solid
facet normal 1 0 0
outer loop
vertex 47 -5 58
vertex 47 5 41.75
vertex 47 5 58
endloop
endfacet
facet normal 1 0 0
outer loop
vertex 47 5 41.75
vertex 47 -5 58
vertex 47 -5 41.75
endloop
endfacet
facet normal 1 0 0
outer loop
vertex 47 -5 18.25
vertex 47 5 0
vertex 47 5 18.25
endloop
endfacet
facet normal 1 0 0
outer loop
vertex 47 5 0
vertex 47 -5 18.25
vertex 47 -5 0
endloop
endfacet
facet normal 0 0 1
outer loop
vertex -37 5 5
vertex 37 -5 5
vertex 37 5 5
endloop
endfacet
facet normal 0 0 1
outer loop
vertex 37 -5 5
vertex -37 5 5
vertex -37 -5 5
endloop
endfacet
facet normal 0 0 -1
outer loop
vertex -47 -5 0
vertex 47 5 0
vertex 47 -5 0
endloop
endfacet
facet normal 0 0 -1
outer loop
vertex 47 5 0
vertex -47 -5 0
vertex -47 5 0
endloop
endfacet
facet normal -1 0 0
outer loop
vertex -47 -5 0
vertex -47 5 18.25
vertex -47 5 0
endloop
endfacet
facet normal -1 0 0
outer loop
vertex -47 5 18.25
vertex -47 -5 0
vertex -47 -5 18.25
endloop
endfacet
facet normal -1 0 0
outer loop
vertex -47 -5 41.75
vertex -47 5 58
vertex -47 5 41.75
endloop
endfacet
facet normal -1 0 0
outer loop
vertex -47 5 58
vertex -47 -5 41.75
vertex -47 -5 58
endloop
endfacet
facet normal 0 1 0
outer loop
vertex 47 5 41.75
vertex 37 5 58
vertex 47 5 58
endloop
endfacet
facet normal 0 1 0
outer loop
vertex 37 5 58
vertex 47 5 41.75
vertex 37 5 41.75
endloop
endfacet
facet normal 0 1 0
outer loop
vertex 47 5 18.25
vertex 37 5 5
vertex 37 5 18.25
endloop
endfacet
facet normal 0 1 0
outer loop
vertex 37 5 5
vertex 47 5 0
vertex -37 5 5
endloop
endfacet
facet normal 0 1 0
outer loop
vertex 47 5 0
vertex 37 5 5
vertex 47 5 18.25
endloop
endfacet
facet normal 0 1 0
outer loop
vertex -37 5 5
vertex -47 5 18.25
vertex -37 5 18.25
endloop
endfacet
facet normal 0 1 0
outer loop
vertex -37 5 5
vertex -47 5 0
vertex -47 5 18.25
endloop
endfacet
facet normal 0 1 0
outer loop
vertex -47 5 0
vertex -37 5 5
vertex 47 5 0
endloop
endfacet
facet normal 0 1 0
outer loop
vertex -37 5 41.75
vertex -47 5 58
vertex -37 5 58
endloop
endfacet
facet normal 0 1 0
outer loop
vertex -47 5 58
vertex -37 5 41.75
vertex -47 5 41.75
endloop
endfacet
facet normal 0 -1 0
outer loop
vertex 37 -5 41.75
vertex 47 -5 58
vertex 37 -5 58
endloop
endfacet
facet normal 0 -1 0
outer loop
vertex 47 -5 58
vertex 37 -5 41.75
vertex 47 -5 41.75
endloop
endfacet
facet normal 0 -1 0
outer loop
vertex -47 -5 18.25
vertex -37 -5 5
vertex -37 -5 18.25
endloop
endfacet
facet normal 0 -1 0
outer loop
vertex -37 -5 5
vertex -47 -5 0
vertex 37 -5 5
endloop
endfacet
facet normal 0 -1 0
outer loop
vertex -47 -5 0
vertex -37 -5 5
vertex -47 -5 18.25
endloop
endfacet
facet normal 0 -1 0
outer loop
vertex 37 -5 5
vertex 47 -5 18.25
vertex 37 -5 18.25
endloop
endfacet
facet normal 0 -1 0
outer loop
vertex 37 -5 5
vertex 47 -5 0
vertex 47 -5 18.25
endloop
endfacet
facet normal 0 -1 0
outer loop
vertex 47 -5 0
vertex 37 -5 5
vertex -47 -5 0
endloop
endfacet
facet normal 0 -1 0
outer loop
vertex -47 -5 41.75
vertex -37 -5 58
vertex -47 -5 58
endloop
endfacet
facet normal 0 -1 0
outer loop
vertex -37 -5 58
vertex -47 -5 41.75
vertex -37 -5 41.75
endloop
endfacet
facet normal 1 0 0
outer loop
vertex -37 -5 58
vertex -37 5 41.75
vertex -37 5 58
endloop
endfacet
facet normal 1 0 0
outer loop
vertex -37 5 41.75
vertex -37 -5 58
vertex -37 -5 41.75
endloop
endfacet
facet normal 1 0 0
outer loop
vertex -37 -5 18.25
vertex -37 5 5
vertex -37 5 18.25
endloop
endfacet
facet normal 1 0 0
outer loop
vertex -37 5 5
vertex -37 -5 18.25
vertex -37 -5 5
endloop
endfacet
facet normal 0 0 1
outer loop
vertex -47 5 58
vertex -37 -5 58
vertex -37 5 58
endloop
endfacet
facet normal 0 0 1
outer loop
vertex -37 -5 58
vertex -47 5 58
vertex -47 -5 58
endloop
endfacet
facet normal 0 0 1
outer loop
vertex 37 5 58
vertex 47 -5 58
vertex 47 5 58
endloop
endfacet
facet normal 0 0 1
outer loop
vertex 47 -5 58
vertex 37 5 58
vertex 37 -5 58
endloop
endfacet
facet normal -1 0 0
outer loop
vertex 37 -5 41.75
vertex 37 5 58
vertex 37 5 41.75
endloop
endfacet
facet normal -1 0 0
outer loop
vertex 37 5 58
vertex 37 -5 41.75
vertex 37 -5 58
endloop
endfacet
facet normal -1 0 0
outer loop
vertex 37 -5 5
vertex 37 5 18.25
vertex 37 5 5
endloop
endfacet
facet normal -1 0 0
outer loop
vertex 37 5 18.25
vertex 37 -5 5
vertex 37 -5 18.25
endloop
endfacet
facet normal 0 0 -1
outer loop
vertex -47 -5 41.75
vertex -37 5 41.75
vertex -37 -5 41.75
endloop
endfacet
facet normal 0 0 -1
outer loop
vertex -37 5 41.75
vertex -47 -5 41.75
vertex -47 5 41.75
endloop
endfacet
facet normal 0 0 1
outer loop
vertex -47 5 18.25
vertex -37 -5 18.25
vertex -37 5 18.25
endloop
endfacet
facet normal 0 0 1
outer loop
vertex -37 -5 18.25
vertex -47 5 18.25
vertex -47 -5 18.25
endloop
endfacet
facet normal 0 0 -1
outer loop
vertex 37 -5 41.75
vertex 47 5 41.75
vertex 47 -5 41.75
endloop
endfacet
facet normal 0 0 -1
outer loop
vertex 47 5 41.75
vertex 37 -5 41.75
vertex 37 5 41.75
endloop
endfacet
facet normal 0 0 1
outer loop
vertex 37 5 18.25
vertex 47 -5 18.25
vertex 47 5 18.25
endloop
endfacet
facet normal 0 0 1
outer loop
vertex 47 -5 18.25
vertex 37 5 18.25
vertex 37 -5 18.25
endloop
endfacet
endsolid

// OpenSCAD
// DRACO-Mini pan/tilt cradle — connected print-ready U-frame
servo_x = 22.8;
servo_y = 12.2;
servo_z = 28.5;
fit_clearance = 0.35;

wall=3;
inner_w=74;
arm_h=58;
arm_d=10;
bridge_w=inner_w+2*arm_d;
bridge_h=5;

// Servo pocket is kept fully inside each arm so subtraction cannot split the frame.
module servo_pocket(){
    cube([
        arm_d+2,
        servo_y+2*fit_clearance,
        servo_x+2*fit_clearance
    ],center=true);
}

module cradle(){
    difference(){
        union(){
            // Bottom bridge overlaps both side arms by bridge_h for a manifold one-piece print.
            translate([0,0,bridge_h/2])
                cube([bridge_w,arm_d,bridge_h],center=true);

            translate([-(inner_w/2+arm_d/2),0,arm_h/2])
                cube([arm_d,arm_d,arm_h],center=true);

            translate([(inner_w/2+arm_d/2),0,arm_h/2])
                cube([arm_d,arm_d,arm_h],center=true);
        }

        // Servo clearances cut inward from each arm without severing the base joint.
        translate([-(inner_w/2+arm_d/2),0,30])
            servo_pocket();
        translate([(inner_w/2+arm_d/2),0,30])
            servo_pocket();
    }
}
cradle();
